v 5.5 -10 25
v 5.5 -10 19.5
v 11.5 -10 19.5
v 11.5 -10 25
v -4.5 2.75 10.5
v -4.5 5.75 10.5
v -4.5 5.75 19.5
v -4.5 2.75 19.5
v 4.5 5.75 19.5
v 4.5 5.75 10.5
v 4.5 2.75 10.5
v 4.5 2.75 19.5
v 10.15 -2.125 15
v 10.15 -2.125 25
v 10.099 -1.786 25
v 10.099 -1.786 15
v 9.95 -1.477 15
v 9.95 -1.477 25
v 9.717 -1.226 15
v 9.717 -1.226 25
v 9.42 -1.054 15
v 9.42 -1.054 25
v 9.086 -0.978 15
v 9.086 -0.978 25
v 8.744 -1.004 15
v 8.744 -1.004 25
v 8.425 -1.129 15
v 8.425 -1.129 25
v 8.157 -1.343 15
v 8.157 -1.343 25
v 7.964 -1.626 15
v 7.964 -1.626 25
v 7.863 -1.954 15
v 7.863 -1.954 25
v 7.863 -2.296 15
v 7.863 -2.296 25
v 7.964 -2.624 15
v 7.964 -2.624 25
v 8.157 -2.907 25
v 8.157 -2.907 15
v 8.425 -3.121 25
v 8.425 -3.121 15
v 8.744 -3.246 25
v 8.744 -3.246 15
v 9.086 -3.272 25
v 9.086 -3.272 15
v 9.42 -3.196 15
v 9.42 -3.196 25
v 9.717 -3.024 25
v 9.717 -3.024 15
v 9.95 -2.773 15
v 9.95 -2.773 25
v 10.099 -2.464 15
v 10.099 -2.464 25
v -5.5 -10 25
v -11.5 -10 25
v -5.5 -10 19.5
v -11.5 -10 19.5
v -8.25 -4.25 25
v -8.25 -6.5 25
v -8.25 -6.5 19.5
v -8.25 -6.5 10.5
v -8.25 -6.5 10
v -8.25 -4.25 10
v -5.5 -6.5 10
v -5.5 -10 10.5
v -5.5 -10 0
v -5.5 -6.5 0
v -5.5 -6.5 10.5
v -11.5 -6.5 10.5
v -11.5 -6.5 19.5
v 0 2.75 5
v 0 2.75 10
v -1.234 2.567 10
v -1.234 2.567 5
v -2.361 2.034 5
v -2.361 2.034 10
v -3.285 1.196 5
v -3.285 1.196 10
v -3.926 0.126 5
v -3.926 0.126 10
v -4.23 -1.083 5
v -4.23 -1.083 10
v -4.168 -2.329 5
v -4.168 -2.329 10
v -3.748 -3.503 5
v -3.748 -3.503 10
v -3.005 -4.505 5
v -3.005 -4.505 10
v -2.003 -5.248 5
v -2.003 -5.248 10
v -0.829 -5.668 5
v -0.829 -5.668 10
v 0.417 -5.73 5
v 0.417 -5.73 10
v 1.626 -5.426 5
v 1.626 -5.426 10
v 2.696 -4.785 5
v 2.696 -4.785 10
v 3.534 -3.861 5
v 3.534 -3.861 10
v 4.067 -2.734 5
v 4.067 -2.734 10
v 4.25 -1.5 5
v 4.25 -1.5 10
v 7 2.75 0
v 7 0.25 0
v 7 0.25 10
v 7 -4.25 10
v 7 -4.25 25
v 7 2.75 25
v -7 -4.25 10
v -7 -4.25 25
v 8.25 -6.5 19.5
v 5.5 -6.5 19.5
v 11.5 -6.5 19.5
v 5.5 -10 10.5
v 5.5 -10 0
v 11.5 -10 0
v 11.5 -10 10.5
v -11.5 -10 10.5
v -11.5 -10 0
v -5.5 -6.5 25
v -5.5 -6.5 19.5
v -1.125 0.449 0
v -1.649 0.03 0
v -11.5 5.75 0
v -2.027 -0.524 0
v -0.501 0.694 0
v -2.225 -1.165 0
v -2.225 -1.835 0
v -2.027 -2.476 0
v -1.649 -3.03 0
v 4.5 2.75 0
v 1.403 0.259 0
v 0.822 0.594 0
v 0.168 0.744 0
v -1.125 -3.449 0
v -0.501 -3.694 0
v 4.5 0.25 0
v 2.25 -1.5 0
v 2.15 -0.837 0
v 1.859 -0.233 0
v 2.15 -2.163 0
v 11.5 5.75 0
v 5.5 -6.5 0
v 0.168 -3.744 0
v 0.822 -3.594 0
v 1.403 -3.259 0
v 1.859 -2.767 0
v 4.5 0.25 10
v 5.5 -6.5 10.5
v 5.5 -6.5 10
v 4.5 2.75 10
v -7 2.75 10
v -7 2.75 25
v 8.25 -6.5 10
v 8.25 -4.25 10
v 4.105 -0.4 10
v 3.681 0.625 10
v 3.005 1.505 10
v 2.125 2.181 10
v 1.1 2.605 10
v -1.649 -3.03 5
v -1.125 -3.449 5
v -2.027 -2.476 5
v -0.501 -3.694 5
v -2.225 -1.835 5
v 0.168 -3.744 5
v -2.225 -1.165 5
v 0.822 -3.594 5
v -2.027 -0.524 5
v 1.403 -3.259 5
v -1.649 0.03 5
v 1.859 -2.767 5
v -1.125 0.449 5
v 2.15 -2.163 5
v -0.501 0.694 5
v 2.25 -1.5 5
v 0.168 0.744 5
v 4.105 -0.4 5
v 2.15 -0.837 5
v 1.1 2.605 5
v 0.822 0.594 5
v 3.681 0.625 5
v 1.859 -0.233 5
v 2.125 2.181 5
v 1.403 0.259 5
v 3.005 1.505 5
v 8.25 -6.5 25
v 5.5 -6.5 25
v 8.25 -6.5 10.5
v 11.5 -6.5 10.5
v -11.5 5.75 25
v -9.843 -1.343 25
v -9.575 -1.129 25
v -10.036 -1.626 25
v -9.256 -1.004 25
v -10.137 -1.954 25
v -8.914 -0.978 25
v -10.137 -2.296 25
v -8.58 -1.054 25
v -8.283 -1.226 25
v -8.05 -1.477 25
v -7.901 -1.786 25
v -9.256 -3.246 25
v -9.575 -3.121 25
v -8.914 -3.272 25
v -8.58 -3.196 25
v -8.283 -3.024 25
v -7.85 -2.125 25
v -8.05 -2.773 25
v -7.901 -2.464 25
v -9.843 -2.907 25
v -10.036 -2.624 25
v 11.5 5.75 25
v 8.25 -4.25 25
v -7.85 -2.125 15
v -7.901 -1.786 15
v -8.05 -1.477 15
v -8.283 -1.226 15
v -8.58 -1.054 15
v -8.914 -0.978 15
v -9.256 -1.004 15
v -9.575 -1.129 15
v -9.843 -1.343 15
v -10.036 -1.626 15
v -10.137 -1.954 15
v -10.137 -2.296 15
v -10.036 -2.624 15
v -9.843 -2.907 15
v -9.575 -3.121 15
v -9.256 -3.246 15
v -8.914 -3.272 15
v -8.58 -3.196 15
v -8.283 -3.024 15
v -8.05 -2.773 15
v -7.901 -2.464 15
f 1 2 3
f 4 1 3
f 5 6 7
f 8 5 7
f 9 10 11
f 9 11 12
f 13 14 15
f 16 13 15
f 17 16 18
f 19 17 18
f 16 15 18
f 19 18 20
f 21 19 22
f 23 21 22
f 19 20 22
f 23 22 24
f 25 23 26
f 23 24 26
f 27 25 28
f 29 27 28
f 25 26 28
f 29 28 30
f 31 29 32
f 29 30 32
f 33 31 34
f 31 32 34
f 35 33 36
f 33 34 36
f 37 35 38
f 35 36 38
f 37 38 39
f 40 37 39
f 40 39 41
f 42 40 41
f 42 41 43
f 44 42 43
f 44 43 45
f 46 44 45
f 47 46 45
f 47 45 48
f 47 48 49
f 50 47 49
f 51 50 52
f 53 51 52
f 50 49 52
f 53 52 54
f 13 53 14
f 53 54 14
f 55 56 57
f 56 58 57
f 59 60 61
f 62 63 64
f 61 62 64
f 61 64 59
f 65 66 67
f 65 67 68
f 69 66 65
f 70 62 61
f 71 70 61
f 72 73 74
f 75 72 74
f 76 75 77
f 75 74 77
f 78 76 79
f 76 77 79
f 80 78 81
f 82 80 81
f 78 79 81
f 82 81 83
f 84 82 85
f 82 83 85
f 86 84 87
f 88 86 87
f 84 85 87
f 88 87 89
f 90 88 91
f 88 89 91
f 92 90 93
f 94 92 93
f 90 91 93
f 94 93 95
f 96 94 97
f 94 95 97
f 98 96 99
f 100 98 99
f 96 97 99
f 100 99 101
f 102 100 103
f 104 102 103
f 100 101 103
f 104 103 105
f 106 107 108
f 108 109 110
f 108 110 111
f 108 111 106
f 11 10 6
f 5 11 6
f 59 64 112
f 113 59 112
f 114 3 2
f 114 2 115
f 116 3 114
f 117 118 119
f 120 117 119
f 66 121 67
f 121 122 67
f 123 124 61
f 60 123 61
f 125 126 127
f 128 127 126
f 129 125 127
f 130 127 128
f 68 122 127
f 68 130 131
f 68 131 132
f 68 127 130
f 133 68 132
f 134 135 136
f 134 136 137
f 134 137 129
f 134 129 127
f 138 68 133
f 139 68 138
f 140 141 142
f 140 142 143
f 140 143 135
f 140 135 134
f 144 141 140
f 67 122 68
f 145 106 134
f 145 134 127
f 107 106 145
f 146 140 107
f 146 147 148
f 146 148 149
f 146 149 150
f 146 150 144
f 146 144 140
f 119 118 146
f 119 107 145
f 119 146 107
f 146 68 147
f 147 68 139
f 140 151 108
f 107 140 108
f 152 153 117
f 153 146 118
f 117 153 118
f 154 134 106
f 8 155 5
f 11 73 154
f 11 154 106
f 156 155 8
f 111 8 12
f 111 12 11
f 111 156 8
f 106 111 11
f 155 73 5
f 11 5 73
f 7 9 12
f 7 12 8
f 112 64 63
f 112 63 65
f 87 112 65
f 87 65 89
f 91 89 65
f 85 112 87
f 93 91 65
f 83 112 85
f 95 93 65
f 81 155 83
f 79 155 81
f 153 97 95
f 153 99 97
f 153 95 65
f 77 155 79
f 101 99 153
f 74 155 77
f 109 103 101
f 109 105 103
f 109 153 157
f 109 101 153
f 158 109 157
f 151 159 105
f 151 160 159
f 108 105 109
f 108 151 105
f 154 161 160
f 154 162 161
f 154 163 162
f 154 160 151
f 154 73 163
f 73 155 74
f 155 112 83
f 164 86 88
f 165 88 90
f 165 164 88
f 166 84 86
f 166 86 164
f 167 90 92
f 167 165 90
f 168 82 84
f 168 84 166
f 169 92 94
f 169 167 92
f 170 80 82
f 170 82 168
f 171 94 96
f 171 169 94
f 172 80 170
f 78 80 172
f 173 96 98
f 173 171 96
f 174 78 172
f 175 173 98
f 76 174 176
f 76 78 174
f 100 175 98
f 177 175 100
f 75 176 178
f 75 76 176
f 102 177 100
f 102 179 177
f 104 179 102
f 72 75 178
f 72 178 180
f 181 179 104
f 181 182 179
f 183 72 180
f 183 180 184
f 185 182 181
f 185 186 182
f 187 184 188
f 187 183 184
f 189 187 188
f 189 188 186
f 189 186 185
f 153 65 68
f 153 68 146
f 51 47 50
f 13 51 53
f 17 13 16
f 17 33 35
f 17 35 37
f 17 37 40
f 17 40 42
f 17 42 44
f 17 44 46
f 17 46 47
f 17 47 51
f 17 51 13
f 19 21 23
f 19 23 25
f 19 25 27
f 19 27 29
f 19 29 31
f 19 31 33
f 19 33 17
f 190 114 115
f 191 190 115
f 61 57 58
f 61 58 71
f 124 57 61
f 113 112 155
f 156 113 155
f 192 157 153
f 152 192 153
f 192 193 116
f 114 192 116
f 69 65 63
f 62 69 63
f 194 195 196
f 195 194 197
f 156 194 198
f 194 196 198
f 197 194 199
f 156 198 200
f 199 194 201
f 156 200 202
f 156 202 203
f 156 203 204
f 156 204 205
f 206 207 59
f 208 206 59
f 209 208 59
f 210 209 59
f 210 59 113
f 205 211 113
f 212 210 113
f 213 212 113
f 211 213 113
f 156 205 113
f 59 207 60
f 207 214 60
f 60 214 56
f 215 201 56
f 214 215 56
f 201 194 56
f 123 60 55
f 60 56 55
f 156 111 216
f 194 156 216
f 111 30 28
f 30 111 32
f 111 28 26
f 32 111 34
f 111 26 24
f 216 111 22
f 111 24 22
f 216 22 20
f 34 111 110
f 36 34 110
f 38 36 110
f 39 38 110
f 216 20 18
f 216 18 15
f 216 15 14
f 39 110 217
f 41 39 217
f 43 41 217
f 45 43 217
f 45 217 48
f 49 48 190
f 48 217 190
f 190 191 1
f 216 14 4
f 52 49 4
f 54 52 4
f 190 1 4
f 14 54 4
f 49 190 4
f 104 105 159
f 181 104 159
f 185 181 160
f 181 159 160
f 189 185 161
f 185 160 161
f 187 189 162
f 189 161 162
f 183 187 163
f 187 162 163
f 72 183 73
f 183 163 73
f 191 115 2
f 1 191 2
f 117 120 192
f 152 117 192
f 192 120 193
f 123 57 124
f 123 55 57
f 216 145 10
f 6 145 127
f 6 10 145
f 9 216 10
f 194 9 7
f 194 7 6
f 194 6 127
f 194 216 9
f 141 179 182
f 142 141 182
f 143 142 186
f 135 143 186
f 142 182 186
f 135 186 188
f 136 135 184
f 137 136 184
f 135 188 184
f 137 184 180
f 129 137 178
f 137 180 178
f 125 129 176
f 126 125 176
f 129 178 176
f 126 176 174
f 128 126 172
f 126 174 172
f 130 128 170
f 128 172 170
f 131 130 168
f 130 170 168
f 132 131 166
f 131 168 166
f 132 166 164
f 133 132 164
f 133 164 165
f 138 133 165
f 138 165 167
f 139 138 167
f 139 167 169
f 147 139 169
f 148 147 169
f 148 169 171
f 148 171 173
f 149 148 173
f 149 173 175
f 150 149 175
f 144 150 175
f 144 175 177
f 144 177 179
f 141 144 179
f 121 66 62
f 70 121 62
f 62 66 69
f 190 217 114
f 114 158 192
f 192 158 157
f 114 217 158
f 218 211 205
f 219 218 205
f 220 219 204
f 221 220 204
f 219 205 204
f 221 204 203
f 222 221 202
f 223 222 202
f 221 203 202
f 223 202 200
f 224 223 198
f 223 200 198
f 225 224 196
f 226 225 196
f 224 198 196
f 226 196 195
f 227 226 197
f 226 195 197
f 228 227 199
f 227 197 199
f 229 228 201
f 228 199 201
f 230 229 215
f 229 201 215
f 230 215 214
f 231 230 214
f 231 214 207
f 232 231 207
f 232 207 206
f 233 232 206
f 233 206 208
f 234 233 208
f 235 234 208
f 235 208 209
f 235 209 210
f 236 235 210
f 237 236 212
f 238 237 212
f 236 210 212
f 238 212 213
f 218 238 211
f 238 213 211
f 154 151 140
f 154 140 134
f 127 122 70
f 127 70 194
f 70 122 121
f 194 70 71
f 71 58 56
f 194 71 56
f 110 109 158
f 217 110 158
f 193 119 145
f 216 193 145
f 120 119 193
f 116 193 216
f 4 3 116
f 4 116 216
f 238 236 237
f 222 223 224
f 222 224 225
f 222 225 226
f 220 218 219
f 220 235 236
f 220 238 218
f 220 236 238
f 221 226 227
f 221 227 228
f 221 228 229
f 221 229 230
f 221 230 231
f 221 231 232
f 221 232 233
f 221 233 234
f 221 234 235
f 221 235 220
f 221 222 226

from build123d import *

# Parameters (mm, degrees)
F0_W      = 23
F0_H      = 20
F1_DEPTH  = 10
F3_DEPTH  = 15
F4_W      = 11
F4_H      = 3.5
F5_DEPTH  = 10.001
F6_DEPTH  = 3.5
F7_W      = 4.5
F7_H      = 15
F7_W_2    = 18.5
F8_DEPTH  = 3
F9_DEPTH  = 7
F10_R     = 2.5
F11_DEPTH = 10.001
F10_R_2   = 5
F12_DEPTH = 4.5
F16_R     = 1.15
F17_DEPTH = 10
F18_R     = 2.25
F19_DEPTH = 10.001
F20_DEPTH = 5
F21_DEPTH = 10.001
F22_W     = 2.5
F22_H     = 2.5
F23_DEPTH = 10.001
F24_W     = 9
F24_H     = 9
F25_DEPTH = 15.751
F26_W     = 3.5
F26_H     = 9
F27_DEPTH = 23.001


# Not quite as in the source:
# - a feature names something its author has since deleted; it is built from what else it names


with BuildPart() as f1:
    # F0 (on Top) → F1 (new body)
    with BuildSketch(Plane.XY):
        Rectangle(F0_W, F0_H)
    extrude(amount=F1_DEPTH)

    # F2 (on face) → F3 (join)
    with BuildSketch(Plane.XY.offset(10)):
        Polygon((5.5, -6.5), (5.5, -10), (11.5, -10), (11.5, -0.75), (7, -0.75), (7, -4.25), (8.25, -4.25), (8.25, -6.5), align=None)
        Polygon((-11.5, -10), (-5.5, -10), (-5.5, -6.5), (-8.25, -6.5), (-8.25, -4.25), (-7, -4.25), (-7, -0.75), (-11.5, -0.75), align=None)
    extrude(amount=F3_DEPTH)

    # F4 (on face) → F5 (cut, through all)
    with BuildSketch(Plane.XY.offset(10)):
        with Locations((0, -8.25)):
            Rectangle(F4_W, F4_H)
    extrude(amount=-F5_DEPTH, mode=Mode.SUBTRACT)

    # F6 (add): faces of the model
    f6_faces = [f1.faces().sort_by_distance(p)[0] for p in [
        (9.25, -0.75, 17.5),
        (-9.25, -0.75, 17.5),
    ]]
    extrude(f6_faces, amount=F6_DEPTH)

    # F7 (on face) → F8 (join)
    with BuildSketch(Plane(origin=(0, 2.75, 0), x_dir=(-1, 0, 0), z_dir=(0, 1, 0))):
        with Locations((-9.25, 17.5)):
            Rectangle(F7_W, F7_H)
        with Locations((2.25, 17.5)):
            Rectangle(F7_W_2, F7_H)
    extrude(amount=F8_DEPTH)

    # F9 (add): a face of the model
    f9_faces = [f1.faces().sort_by_distance(p)[0] for p in [
        (0, 10, 5),
    ]]
    extrude(f9_faces, amount=F9_DEPTH)

    # F10 (on face) → F11 (cut, through all)
    with BuildSketch(Plane.XY.offset(10)):
        with Locations((0, 11.25)):
            Circle(F10_R)
    extrude(amount=-F11_DEPTH, mode=Mode.SUBTRACT)

    # F10 (on face) → F12 (cut)
    with BuildSketch(Plane.XY.offset(10)):
        with Locations((0, 11.25)):
            Circle(F10_R_2)
        with Locations((0, 11.25)):
            Circle(F10_R, mode=Mode.SUBTRACT)
    extrude(amount=-F12_DEPTH, mode=Mode.SUBTRACT)

    # F16 (on face) → F17 (cut)
    with BuildSketch(Plane.XY.offset(25)):
        with Locations((-9, -2.125)):
            Circle(F16_R)
        with Locations((9, -2.125)):
            Circle(F16_R)
    extrude(amount=-F17_DEPTH, mode=Mode.SUBTRACT)

    # F18 (on face) → F19 (cut, through all)
    with BuildSketch(Plane.XY.offset(10)):
        with Locations((0, -1.5)):
            Circle(F18_R)
    extrude(amount=-F19_DEPTH, mode=Mode.SUBTRACT)

    # F18 (on face) → F20 (cut)
    with BuildSketch(Plane.XY.offset(10)):
        with BuildLine():
            ThreePointArc((0, 2.75), (-3.00520382, -4.50520382), (4.25, -1.5))
            ThreePointArc((4.25, -1.5), (3.00520382, 1.50520382), (0, 2.75))
        make_face()
        with Locations((0, -1.5)):
            Circle(F18_R, mode=Mode.SUBTRACT)
    extrude(amount=-F20_DEPTH, mode=Mode.SUBTRACT)

    # F21 (cut, through all): faces of the model
    f21_faces = [f1.faces().sort_by_distance(p)[0] for p in [
        (-11.2439604523, 11.375, 10),
        (-4.8585786438, 11.25, 5.5),
    ]]
    extrude(f21_faces, amount=-F21_DEPTH, mode=Mode.SUBTRACT)

    # F22 (on face) → F23 (cut, through all)
    with BuildSketch(Plane.XY.offset(10)):
        with Locations((5.75, 1.5)):
            Rectangle(F22_W, F22_H)
    extrude(amount=-F23_DEPTH, mode=Mode.SUBTRACT)

    # F24 (on face) → F25 (cut, through all)
    with BuildSketch(Plane(origin=(0, 5.75, 0), x_dir=(-1, 0, 0), z_dir=(0, 1, 0))):
        with Locations((0, 15)):
            Rectangle(F24_W, F24_H)
    extrude(amount=-F25_DEPTH, mode=Mode.SUBTRACT)

    # F26 (on face) → F27 (cut, through all)
    with BuildSketch(Plane.YZ.offset(11.5)):
        with Locations((-8.25, 15)):
            Rectangle(F26_W, F26_H)
    extrude(amount=-F27_DEPTH, mode=Mode.SUBTRACT)


solid = f1.part
